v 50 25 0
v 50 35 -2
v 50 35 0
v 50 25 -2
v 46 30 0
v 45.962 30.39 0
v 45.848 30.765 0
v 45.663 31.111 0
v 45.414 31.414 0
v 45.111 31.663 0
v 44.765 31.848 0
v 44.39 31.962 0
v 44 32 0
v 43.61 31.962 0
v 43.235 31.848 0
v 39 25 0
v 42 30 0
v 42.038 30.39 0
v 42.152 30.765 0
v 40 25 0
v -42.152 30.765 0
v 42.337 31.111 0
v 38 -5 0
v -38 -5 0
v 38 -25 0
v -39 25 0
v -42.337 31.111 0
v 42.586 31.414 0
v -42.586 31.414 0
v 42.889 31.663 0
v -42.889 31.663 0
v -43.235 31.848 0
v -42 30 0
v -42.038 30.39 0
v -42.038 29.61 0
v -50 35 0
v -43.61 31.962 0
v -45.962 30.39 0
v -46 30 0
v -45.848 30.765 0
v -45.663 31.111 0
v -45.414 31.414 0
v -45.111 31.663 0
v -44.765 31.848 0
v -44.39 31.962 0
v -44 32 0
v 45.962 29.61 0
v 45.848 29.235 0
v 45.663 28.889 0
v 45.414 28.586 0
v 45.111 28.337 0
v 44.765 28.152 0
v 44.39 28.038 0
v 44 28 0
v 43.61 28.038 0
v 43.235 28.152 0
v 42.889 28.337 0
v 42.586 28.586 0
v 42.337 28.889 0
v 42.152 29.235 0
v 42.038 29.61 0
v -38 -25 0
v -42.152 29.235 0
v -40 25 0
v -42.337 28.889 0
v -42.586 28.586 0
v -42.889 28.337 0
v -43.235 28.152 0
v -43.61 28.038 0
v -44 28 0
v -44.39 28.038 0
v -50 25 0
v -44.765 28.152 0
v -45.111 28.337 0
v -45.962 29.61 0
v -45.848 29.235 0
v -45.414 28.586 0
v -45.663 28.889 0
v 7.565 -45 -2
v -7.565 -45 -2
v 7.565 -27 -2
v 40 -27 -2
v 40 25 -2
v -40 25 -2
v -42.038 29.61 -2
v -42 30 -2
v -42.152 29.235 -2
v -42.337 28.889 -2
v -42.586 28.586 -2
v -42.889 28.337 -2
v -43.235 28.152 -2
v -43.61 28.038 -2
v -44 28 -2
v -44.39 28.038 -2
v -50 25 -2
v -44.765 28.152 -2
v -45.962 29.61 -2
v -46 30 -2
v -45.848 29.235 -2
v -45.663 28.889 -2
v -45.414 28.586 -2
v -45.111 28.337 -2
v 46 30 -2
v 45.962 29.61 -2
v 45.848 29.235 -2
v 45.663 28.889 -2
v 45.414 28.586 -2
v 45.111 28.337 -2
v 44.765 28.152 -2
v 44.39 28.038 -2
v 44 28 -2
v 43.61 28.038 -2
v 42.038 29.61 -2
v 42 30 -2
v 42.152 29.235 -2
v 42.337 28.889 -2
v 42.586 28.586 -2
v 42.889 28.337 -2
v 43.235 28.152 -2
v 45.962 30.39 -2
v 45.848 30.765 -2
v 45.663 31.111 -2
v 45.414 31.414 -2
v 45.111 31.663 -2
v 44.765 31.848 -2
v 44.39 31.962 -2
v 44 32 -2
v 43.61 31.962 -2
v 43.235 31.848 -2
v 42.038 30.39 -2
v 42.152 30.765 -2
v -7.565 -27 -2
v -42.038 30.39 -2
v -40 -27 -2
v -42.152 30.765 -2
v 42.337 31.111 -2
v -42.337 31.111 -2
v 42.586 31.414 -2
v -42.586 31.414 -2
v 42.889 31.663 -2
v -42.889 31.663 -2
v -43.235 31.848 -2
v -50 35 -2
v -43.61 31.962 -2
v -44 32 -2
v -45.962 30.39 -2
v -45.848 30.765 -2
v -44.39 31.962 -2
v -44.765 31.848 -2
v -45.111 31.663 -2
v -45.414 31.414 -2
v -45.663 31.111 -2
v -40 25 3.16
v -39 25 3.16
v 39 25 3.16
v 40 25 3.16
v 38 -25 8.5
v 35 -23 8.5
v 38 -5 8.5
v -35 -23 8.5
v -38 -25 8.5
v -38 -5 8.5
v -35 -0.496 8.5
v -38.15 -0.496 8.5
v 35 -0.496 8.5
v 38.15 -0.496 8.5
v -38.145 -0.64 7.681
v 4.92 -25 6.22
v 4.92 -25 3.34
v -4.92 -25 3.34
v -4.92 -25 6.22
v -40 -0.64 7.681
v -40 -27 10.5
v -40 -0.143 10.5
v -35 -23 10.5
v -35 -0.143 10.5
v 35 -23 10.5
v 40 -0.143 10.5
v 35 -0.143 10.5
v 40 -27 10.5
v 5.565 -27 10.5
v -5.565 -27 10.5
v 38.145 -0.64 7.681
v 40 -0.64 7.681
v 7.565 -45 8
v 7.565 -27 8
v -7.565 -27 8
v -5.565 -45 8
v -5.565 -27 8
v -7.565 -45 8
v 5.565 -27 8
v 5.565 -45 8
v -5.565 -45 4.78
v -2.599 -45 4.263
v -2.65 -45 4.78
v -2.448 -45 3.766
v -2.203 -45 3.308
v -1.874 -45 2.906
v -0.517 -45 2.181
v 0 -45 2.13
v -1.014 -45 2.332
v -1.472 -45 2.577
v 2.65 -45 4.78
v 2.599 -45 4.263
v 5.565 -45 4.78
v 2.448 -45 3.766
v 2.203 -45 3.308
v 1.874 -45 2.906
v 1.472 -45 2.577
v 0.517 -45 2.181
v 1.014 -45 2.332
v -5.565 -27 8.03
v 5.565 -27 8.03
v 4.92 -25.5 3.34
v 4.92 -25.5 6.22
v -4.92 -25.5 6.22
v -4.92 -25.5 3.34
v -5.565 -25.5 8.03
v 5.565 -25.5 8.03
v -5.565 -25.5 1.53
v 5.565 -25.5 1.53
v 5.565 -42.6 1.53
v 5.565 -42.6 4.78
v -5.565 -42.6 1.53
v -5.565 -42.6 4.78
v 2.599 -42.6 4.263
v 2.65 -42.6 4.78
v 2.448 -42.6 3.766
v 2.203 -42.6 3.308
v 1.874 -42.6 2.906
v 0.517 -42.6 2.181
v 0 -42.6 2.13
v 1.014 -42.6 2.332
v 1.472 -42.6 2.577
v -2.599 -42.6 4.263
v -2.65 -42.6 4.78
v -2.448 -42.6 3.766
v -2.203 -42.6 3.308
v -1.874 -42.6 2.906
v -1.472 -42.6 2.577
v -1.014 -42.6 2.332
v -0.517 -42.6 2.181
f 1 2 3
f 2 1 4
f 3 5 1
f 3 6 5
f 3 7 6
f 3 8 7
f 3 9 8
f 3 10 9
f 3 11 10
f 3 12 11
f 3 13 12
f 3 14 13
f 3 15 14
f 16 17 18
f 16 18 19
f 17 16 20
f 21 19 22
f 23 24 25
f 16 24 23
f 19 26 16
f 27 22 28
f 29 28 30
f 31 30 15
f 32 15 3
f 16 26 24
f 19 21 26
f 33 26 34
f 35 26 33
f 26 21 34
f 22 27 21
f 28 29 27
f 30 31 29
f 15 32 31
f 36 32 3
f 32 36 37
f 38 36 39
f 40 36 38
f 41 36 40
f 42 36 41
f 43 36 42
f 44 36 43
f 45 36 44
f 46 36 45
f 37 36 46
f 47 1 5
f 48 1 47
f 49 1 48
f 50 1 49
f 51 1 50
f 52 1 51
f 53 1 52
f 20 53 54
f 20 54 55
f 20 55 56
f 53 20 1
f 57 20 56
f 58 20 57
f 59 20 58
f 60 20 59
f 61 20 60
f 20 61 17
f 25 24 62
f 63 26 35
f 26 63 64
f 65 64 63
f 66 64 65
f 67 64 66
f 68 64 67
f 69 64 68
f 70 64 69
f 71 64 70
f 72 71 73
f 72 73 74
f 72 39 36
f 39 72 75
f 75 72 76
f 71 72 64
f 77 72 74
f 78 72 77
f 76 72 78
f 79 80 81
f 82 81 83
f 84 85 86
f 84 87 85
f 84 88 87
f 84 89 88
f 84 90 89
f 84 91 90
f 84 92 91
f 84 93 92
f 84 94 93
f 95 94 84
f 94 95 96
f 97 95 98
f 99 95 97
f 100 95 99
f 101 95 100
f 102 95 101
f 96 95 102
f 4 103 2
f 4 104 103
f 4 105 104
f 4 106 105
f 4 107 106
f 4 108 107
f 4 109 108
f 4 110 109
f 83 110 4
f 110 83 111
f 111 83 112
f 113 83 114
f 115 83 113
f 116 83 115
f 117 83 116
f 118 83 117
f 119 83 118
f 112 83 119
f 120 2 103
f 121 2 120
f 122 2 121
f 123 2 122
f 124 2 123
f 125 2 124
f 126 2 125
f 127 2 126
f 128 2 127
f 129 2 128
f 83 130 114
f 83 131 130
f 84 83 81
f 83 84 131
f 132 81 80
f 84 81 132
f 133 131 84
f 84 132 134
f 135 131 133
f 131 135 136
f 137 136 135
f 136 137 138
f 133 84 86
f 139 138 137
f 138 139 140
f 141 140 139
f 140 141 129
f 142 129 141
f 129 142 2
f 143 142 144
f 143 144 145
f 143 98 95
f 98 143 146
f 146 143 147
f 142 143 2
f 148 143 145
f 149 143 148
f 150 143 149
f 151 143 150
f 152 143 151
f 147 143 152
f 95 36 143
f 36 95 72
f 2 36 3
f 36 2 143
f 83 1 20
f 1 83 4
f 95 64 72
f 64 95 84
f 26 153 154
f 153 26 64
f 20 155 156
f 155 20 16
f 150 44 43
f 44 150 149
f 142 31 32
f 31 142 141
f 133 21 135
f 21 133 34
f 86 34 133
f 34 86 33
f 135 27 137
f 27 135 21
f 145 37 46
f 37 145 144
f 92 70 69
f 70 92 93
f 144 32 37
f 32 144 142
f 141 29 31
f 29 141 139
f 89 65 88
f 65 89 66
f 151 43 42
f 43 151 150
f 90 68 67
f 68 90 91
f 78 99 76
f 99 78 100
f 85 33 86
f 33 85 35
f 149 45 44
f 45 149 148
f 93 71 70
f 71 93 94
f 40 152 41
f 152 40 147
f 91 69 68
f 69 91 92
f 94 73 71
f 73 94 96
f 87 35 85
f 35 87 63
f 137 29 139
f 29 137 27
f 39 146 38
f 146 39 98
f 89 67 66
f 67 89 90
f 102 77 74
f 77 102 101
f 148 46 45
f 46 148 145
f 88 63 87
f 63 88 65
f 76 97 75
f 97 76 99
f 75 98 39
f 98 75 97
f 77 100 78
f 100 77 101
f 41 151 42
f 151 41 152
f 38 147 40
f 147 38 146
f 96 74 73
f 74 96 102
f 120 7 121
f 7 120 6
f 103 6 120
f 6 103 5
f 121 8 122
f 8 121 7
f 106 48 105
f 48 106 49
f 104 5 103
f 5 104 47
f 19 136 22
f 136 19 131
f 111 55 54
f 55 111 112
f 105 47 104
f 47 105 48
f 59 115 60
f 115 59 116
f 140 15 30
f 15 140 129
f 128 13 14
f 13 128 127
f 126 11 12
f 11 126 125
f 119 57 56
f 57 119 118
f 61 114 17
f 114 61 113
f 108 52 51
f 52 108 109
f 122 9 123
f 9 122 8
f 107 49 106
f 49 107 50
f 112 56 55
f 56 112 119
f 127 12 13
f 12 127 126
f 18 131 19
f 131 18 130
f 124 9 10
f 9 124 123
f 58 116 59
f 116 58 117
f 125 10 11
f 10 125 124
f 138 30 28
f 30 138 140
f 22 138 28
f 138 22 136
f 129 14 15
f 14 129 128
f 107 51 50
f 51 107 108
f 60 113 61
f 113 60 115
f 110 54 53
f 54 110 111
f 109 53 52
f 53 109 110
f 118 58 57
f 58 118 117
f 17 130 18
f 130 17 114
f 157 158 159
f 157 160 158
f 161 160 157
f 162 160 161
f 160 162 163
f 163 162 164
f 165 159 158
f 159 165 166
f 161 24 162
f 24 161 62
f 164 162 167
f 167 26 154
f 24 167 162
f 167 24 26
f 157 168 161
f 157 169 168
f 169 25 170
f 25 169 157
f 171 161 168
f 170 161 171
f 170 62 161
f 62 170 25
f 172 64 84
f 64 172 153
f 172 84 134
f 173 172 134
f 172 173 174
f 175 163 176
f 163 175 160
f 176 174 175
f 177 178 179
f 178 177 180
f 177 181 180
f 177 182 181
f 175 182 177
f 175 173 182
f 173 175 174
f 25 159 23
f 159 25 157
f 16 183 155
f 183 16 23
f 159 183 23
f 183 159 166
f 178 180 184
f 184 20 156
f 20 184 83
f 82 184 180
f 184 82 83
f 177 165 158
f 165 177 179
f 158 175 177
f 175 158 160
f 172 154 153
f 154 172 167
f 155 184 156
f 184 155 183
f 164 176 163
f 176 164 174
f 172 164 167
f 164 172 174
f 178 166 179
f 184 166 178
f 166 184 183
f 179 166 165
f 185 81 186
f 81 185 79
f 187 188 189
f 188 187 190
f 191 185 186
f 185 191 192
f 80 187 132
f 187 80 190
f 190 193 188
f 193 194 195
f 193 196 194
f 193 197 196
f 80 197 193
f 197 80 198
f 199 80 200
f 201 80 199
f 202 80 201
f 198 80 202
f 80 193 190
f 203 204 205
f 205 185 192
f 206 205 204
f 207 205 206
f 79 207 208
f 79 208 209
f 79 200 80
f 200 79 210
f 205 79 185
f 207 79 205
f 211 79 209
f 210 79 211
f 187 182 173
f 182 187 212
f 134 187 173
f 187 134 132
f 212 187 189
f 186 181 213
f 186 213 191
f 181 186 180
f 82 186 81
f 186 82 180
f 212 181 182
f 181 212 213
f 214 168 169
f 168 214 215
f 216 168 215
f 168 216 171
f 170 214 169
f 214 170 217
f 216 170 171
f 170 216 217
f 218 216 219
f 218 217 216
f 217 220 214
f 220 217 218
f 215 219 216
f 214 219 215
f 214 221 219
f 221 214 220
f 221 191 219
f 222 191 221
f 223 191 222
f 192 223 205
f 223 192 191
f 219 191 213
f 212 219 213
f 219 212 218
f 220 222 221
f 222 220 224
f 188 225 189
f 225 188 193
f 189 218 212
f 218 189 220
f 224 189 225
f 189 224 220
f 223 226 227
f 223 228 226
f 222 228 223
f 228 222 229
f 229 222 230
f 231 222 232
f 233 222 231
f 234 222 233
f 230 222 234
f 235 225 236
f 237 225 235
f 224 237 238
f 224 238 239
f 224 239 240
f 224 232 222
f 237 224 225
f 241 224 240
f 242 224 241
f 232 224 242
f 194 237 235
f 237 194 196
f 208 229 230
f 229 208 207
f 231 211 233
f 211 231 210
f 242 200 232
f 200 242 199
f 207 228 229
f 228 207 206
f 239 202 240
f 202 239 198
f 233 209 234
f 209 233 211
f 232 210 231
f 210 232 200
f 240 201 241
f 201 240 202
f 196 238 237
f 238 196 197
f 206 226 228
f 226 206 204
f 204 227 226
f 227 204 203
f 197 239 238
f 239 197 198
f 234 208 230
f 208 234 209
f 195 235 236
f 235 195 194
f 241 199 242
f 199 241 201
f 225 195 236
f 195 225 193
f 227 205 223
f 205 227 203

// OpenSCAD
// done, Need to fix z_offset USB
// done, Need to have more space for the USB connector (height)
// Need to make USB connector poke out further

$fn = 32;

w = 80;
w_nokia = 76;
t = 2;
t_nokia = 8.5;
h = 50;

w_usb_a = 8.2 * 1.2;
w_usb_b = 10.6 * 1.05;
h_usb = 16.1 + 1;
z_offset_usb = 4.48 - 0.9;
h_usb_block = 10;


module nokia() {
	color("black")
		translate([-w_nokia / 2, 0, 0])
			cube(size=[w_nokia, 76, t_nokia]);
}

module screwBlock() {
	difference() {
		cube(size=[w + 20, 10, t], center=true);
		translate([-w / 2 - 4, 0, 0])
			cylinder(h=t * 2, d=4, center=true);
		translate([w / 2 + 4, 0, 0])
			cylinder(h=t * 2, d=4, center=true);
	}
}

module wedge() {
	linear_extrude(t_nokia)
		polygon([
			[0, 0],
			[(w - w_nokia) / 2, 0],
			[(w - w_nokia) / 2, 20],
			[(w - w_nokia) / 2 - 1, h],
			[0, h]
		]);
	translate([0, 0, t_nokia])
		cube(size=[5, h, t], center=false);
}

module holder() {
	translate([0, 0, -t / 2])
		cube(size=[w, h, t], center=true);

	translate([-w / 2, -h / 2, 0])
		wedge();

	translate([w / 2, -h / 2, 0])
		mirror([1, 0, 0])
			wedge();

	translate([-w / 2, -h / 2, t_nokia])
		cube(size=[w, t, t]);
}

module usb_mock() {
	translate([0, -h_usb / 2, 1.2]) {
		translate([0, h_usb / 2 + 6.6 / 2, 0])
			cube(size=[w_usb_a, 6.6, 2.4 * 1.2], center=true);
		cube(size=[w_usb_b, h_usb, 6.5], center=true);
		translate([0, -10, 0])
			rotate([90, 0 ,0])
				cylinder(h=20, d=5.3, center=true);
	}
}

module conBlock() {
	translate([0, -10, t_nokia / 2])
		difference() {
			union() {
				translate([0, 0, (h_usb_block - t_nokia ) / 2 - t])
					cube(size=[w_usb_b + 2 * t, 20, h_usb_block], center=true);
				translate([0, 10 - t / 2, 0])
					cube(size=[w, t, t_nokia + 2 * t], center=true);
			}
			translate([0, 10 - 0.5, z_offset_usb - t_nokia / 2])
				usb_mock();
			translate([0, -t, 5 + z_offset_usb - 6.1 / 2])
				cube(size=[w_usb_b, 20, 10], center=true);
		}
}

// translate([0, -h / 2, 0])
// 	nokia();

module phone_holder() {
	union() {
		translate([0, h / 2 + 5, -t / 2])
			screwBlock();

		difference() {
			holder();
			translate([0, 15, 10])
				rotate(([-10, 0, 0]))
					cube([w + 10, 30, 10], center=true);
		}

		translate([0, -h / 2, 0])
			conBlock();
	}
}

intersection() {
	phone_holder();
	// translate([-25, 0, 0])
	// 	cube(size=[50, 100, 50], center=true);
}

	// translate([0, -h / 2 - 1.2, z_offset_usb])
	// 	color("grey") usb_mock();
